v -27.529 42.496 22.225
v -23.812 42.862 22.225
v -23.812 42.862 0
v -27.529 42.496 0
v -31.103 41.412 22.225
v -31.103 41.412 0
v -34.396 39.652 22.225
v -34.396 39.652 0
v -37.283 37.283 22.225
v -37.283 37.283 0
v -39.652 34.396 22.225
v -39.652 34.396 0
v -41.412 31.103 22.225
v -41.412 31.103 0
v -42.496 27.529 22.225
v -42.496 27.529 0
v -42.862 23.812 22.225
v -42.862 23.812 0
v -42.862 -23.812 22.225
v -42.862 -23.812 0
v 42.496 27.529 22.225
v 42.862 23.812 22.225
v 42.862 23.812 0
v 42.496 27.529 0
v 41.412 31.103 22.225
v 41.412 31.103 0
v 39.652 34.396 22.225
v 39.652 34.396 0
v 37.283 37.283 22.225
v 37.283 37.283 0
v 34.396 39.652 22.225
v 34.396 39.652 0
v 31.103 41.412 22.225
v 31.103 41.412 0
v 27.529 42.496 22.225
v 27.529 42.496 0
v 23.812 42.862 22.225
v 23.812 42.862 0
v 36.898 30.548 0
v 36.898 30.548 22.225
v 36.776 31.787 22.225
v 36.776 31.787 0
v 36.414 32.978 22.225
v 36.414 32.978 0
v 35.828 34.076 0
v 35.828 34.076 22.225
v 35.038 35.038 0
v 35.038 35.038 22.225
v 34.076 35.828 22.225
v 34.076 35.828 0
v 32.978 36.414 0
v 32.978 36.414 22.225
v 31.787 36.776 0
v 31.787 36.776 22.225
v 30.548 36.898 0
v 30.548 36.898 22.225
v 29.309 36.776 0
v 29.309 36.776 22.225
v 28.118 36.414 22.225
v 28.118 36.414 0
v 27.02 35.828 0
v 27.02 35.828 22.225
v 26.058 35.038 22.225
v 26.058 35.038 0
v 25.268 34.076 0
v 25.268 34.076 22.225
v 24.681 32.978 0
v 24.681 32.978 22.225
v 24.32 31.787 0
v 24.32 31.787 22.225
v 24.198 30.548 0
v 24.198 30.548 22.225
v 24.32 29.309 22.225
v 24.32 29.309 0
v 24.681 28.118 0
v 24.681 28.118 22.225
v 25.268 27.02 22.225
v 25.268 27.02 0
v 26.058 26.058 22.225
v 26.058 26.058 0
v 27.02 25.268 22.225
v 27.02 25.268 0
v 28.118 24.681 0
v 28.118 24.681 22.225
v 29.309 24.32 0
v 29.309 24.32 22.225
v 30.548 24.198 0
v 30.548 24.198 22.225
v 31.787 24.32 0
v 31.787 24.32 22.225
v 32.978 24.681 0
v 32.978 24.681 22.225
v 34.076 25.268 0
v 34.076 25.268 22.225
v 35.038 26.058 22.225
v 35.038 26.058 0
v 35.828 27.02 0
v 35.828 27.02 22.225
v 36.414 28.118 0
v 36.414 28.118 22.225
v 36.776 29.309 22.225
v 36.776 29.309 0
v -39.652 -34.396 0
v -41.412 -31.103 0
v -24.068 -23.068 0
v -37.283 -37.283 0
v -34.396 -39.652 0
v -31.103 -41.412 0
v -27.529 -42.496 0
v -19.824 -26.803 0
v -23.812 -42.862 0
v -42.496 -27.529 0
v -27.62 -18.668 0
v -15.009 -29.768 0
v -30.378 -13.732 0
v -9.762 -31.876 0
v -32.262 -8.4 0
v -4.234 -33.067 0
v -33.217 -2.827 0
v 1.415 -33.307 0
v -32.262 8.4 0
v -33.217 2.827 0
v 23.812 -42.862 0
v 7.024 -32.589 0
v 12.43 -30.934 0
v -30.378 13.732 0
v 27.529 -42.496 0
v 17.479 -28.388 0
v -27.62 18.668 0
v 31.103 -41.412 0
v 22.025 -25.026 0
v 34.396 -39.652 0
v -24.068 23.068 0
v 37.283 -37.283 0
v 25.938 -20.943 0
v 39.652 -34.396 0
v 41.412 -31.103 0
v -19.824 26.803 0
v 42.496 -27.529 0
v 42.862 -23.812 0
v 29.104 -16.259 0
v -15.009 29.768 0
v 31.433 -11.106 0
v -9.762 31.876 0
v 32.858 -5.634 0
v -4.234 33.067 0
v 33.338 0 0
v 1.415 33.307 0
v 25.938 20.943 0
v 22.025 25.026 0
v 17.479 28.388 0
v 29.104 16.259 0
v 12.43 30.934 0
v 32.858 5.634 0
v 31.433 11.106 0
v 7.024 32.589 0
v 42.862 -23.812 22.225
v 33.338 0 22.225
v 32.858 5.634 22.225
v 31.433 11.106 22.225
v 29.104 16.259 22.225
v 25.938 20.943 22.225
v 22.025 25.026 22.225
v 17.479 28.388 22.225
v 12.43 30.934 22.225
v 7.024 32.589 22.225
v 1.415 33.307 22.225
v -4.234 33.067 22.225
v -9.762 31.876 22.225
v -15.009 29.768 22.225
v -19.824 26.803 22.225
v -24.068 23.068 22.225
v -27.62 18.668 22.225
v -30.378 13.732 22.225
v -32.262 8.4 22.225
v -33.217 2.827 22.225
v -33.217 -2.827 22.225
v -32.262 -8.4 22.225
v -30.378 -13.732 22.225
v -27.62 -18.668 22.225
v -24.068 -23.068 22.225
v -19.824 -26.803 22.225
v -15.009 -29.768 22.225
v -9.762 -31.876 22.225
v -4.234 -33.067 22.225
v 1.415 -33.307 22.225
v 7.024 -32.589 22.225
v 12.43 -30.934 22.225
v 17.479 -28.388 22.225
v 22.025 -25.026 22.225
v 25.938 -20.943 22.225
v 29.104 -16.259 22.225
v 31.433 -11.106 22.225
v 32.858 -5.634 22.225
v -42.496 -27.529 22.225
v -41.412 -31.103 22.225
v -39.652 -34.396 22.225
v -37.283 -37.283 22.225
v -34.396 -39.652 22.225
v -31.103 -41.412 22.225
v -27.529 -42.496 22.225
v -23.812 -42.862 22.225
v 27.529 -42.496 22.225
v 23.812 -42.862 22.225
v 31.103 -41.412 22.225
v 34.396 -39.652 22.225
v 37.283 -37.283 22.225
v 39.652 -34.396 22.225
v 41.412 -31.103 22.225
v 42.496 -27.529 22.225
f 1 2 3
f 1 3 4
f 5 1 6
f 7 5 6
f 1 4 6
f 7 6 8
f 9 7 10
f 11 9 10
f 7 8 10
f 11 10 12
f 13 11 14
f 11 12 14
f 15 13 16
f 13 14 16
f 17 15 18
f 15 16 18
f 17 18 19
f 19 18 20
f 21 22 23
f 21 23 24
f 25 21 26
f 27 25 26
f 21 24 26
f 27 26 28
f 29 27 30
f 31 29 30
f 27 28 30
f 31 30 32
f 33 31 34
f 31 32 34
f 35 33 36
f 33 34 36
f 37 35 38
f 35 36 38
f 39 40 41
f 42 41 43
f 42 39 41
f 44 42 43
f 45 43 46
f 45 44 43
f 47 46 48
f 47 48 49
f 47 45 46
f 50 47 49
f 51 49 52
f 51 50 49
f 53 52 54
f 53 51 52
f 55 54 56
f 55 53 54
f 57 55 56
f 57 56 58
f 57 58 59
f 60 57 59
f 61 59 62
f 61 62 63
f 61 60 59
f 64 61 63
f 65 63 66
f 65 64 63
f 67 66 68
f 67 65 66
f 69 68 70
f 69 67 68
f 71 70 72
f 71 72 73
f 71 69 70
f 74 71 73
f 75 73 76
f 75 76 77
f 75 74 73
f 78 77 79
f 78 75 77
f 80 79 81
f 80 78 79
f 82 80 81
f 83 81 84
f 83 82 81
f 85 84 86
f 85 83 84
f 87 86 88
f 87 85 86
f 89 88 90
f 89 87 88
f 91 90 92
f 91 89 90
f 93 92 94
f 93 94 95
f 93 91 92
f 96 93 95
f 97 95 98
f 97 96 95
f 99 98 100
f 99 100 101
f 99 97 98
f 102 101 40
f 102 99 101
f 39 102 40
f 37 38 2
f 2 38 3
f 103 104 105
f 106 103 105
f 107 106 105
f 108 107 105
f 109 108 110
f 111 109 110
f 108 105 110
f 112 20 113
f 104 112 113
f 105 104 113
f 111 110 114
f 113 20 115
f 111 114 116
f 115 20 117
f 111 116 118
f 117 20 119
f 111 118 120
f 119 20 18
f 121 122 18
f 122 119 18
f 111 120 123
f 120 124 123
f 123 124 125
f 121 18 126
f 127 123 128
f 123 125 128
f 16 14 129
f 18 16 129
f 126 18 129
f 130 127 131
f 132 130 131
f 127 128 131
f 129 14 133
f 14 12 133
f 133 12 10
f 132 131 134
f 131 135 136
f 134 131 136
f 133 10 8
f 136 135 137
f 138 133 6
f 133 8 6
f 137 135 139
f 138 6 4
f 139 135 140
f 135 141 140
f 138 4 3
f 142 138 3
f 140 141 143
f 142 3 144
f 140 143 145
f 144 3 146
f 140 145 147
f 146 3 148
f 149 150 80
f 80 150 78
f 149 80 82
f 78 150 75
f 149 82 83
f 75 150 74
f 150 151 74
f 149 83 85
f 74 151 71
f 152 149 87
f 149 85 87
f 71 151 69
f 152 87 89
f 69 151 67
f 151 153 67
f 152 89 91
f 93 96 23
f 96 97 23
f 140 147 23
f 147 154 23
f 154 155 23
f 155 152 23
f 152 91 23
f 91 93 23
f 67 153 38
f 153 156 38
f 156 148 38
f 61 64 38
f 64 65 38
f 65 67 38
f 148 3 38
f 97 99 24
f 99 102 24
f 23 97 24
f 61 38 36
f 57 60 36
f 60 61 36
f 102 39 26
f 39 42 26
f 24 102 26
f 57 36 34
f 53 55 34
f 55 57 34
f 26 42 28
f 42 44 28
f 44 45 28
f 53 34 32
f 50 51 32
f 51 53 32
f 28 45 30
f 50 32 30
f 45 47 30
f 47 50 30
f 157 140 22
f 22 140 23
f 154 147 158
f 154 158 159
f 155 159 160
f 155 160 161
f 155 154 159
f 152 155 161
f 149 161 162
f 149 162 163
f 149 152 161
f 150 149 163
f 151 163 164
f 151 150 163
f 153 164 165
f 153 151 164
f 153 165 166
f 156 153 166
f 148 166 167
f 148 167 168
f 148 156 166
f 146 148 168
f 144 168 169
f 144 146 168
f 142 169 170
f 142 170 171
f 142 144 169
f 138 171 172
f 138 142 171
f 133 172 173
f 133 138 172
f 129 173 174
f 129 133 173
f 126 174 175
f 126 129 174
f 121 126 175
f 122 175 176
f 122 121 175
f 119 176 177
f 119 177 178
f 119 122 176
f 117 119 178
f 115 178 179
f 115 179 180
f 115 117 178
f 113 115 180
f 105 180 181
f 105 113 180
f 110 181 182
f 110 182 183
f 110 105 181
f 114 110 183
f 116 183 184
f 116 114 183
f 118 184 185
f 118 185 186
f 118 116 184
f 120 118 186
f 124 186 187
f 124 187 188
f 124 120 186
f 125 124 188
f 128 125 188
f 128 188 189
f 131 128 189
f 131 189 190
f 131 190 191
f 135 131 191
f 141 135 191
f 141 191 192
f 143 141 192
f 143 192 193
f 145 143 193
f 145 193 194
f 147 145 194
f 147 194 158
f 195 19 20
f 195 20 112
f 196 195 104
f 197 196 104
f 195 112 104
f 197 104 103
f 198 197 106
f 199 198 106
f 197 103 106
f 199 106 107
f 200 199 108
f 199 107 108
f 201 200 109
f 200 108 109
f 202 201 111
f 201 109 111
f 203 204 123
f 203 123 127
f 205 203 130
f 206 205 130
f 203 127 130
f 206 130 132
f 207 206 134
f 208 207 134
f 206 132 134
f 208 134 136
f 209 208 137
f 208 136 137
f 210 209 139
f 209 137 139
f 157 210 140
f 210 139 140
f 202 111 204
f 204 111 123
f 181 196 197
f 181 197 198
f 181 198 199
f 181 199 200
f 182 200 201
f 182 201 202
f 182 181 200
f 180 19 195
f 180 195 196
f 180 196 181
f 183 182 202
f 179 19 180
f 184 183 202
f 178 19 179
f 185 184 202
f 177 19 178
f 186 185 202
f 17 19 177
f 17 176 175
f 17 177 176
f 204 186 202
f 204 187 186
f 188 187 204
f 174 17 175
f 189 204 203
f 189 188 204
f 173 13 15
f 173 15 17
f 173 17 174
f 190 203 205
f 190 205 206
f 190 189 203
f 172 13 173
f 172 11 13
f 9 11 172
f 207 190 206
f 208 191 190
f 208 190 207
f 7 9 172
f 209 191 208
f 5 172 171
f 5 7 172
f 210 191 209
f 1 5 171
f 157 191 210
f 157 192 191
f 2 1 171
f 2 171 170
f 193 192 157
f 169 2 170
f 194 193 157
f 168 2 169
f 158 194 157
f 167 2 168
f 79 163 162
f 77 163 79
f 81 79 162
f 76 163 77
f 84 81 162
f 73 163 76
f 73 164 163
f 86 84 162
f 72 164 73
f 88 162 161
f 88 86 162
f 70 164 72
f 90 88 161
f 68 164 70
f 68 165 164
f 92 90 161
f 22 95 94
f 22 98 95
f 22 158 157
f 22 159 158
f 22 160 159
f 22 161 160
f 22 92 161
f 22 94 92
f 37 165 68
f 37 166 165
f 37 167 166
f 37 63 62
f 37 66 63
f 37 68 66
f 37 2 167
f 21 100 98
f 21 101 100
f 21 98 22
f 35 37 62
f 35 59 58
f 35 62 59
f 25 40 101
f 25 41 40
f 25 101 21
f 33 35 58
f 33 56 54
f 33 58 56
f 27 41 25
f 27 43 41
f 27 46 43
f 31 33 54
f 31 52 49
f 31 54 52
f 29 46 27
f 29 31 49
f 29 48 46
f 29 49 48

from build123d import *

# Parameters (mm, degrees)
F0_R     = 33.3375
F0_R_2   = 6.35
F1_DEPTH = 22.225


with BuildPart() as f1:
    # F0 (on Top) → F1 (new body)
    with BuildSketch(Plane.XY):
        with BuildLine():
            ThreePointArc((-42.8625, -23.8125), (-37.282884, -37.282884), (-23.8125, -42.8625))
            Line((-23.8125, -42.8625), (23.8125, -42.8625))
            ThreePointArc((23.8125, -42.8625), (37.282884, -37.282884), (42.8625, -23.8125))
            Line((42.8625, -23.8125), (42.8625, 23.8125))
            ThreePointArc((42.8625, 23.8125), (37.282884, 37.282884), (23.8125, 42.8625))
            Line((23.8125, 42.8625), (-23.8125, 42.8625))
            ThreePointArc((-23.8125, 42.8625), (-37.282884, 37.282884), (-42.8625, 23.8125))
            Line((-42.8625, 23.8125), (-42.8625, -23.8125))
        make_face()
        Circle(F0_R, mode=Mode.SUBTRACT)
        with Locations((30.547692, 30.547692)):
            Circle(F0_R_2, mode=Mode.SUBTRACT)
    extrude(amount=F1_DEPTH)


solid = f1.part
